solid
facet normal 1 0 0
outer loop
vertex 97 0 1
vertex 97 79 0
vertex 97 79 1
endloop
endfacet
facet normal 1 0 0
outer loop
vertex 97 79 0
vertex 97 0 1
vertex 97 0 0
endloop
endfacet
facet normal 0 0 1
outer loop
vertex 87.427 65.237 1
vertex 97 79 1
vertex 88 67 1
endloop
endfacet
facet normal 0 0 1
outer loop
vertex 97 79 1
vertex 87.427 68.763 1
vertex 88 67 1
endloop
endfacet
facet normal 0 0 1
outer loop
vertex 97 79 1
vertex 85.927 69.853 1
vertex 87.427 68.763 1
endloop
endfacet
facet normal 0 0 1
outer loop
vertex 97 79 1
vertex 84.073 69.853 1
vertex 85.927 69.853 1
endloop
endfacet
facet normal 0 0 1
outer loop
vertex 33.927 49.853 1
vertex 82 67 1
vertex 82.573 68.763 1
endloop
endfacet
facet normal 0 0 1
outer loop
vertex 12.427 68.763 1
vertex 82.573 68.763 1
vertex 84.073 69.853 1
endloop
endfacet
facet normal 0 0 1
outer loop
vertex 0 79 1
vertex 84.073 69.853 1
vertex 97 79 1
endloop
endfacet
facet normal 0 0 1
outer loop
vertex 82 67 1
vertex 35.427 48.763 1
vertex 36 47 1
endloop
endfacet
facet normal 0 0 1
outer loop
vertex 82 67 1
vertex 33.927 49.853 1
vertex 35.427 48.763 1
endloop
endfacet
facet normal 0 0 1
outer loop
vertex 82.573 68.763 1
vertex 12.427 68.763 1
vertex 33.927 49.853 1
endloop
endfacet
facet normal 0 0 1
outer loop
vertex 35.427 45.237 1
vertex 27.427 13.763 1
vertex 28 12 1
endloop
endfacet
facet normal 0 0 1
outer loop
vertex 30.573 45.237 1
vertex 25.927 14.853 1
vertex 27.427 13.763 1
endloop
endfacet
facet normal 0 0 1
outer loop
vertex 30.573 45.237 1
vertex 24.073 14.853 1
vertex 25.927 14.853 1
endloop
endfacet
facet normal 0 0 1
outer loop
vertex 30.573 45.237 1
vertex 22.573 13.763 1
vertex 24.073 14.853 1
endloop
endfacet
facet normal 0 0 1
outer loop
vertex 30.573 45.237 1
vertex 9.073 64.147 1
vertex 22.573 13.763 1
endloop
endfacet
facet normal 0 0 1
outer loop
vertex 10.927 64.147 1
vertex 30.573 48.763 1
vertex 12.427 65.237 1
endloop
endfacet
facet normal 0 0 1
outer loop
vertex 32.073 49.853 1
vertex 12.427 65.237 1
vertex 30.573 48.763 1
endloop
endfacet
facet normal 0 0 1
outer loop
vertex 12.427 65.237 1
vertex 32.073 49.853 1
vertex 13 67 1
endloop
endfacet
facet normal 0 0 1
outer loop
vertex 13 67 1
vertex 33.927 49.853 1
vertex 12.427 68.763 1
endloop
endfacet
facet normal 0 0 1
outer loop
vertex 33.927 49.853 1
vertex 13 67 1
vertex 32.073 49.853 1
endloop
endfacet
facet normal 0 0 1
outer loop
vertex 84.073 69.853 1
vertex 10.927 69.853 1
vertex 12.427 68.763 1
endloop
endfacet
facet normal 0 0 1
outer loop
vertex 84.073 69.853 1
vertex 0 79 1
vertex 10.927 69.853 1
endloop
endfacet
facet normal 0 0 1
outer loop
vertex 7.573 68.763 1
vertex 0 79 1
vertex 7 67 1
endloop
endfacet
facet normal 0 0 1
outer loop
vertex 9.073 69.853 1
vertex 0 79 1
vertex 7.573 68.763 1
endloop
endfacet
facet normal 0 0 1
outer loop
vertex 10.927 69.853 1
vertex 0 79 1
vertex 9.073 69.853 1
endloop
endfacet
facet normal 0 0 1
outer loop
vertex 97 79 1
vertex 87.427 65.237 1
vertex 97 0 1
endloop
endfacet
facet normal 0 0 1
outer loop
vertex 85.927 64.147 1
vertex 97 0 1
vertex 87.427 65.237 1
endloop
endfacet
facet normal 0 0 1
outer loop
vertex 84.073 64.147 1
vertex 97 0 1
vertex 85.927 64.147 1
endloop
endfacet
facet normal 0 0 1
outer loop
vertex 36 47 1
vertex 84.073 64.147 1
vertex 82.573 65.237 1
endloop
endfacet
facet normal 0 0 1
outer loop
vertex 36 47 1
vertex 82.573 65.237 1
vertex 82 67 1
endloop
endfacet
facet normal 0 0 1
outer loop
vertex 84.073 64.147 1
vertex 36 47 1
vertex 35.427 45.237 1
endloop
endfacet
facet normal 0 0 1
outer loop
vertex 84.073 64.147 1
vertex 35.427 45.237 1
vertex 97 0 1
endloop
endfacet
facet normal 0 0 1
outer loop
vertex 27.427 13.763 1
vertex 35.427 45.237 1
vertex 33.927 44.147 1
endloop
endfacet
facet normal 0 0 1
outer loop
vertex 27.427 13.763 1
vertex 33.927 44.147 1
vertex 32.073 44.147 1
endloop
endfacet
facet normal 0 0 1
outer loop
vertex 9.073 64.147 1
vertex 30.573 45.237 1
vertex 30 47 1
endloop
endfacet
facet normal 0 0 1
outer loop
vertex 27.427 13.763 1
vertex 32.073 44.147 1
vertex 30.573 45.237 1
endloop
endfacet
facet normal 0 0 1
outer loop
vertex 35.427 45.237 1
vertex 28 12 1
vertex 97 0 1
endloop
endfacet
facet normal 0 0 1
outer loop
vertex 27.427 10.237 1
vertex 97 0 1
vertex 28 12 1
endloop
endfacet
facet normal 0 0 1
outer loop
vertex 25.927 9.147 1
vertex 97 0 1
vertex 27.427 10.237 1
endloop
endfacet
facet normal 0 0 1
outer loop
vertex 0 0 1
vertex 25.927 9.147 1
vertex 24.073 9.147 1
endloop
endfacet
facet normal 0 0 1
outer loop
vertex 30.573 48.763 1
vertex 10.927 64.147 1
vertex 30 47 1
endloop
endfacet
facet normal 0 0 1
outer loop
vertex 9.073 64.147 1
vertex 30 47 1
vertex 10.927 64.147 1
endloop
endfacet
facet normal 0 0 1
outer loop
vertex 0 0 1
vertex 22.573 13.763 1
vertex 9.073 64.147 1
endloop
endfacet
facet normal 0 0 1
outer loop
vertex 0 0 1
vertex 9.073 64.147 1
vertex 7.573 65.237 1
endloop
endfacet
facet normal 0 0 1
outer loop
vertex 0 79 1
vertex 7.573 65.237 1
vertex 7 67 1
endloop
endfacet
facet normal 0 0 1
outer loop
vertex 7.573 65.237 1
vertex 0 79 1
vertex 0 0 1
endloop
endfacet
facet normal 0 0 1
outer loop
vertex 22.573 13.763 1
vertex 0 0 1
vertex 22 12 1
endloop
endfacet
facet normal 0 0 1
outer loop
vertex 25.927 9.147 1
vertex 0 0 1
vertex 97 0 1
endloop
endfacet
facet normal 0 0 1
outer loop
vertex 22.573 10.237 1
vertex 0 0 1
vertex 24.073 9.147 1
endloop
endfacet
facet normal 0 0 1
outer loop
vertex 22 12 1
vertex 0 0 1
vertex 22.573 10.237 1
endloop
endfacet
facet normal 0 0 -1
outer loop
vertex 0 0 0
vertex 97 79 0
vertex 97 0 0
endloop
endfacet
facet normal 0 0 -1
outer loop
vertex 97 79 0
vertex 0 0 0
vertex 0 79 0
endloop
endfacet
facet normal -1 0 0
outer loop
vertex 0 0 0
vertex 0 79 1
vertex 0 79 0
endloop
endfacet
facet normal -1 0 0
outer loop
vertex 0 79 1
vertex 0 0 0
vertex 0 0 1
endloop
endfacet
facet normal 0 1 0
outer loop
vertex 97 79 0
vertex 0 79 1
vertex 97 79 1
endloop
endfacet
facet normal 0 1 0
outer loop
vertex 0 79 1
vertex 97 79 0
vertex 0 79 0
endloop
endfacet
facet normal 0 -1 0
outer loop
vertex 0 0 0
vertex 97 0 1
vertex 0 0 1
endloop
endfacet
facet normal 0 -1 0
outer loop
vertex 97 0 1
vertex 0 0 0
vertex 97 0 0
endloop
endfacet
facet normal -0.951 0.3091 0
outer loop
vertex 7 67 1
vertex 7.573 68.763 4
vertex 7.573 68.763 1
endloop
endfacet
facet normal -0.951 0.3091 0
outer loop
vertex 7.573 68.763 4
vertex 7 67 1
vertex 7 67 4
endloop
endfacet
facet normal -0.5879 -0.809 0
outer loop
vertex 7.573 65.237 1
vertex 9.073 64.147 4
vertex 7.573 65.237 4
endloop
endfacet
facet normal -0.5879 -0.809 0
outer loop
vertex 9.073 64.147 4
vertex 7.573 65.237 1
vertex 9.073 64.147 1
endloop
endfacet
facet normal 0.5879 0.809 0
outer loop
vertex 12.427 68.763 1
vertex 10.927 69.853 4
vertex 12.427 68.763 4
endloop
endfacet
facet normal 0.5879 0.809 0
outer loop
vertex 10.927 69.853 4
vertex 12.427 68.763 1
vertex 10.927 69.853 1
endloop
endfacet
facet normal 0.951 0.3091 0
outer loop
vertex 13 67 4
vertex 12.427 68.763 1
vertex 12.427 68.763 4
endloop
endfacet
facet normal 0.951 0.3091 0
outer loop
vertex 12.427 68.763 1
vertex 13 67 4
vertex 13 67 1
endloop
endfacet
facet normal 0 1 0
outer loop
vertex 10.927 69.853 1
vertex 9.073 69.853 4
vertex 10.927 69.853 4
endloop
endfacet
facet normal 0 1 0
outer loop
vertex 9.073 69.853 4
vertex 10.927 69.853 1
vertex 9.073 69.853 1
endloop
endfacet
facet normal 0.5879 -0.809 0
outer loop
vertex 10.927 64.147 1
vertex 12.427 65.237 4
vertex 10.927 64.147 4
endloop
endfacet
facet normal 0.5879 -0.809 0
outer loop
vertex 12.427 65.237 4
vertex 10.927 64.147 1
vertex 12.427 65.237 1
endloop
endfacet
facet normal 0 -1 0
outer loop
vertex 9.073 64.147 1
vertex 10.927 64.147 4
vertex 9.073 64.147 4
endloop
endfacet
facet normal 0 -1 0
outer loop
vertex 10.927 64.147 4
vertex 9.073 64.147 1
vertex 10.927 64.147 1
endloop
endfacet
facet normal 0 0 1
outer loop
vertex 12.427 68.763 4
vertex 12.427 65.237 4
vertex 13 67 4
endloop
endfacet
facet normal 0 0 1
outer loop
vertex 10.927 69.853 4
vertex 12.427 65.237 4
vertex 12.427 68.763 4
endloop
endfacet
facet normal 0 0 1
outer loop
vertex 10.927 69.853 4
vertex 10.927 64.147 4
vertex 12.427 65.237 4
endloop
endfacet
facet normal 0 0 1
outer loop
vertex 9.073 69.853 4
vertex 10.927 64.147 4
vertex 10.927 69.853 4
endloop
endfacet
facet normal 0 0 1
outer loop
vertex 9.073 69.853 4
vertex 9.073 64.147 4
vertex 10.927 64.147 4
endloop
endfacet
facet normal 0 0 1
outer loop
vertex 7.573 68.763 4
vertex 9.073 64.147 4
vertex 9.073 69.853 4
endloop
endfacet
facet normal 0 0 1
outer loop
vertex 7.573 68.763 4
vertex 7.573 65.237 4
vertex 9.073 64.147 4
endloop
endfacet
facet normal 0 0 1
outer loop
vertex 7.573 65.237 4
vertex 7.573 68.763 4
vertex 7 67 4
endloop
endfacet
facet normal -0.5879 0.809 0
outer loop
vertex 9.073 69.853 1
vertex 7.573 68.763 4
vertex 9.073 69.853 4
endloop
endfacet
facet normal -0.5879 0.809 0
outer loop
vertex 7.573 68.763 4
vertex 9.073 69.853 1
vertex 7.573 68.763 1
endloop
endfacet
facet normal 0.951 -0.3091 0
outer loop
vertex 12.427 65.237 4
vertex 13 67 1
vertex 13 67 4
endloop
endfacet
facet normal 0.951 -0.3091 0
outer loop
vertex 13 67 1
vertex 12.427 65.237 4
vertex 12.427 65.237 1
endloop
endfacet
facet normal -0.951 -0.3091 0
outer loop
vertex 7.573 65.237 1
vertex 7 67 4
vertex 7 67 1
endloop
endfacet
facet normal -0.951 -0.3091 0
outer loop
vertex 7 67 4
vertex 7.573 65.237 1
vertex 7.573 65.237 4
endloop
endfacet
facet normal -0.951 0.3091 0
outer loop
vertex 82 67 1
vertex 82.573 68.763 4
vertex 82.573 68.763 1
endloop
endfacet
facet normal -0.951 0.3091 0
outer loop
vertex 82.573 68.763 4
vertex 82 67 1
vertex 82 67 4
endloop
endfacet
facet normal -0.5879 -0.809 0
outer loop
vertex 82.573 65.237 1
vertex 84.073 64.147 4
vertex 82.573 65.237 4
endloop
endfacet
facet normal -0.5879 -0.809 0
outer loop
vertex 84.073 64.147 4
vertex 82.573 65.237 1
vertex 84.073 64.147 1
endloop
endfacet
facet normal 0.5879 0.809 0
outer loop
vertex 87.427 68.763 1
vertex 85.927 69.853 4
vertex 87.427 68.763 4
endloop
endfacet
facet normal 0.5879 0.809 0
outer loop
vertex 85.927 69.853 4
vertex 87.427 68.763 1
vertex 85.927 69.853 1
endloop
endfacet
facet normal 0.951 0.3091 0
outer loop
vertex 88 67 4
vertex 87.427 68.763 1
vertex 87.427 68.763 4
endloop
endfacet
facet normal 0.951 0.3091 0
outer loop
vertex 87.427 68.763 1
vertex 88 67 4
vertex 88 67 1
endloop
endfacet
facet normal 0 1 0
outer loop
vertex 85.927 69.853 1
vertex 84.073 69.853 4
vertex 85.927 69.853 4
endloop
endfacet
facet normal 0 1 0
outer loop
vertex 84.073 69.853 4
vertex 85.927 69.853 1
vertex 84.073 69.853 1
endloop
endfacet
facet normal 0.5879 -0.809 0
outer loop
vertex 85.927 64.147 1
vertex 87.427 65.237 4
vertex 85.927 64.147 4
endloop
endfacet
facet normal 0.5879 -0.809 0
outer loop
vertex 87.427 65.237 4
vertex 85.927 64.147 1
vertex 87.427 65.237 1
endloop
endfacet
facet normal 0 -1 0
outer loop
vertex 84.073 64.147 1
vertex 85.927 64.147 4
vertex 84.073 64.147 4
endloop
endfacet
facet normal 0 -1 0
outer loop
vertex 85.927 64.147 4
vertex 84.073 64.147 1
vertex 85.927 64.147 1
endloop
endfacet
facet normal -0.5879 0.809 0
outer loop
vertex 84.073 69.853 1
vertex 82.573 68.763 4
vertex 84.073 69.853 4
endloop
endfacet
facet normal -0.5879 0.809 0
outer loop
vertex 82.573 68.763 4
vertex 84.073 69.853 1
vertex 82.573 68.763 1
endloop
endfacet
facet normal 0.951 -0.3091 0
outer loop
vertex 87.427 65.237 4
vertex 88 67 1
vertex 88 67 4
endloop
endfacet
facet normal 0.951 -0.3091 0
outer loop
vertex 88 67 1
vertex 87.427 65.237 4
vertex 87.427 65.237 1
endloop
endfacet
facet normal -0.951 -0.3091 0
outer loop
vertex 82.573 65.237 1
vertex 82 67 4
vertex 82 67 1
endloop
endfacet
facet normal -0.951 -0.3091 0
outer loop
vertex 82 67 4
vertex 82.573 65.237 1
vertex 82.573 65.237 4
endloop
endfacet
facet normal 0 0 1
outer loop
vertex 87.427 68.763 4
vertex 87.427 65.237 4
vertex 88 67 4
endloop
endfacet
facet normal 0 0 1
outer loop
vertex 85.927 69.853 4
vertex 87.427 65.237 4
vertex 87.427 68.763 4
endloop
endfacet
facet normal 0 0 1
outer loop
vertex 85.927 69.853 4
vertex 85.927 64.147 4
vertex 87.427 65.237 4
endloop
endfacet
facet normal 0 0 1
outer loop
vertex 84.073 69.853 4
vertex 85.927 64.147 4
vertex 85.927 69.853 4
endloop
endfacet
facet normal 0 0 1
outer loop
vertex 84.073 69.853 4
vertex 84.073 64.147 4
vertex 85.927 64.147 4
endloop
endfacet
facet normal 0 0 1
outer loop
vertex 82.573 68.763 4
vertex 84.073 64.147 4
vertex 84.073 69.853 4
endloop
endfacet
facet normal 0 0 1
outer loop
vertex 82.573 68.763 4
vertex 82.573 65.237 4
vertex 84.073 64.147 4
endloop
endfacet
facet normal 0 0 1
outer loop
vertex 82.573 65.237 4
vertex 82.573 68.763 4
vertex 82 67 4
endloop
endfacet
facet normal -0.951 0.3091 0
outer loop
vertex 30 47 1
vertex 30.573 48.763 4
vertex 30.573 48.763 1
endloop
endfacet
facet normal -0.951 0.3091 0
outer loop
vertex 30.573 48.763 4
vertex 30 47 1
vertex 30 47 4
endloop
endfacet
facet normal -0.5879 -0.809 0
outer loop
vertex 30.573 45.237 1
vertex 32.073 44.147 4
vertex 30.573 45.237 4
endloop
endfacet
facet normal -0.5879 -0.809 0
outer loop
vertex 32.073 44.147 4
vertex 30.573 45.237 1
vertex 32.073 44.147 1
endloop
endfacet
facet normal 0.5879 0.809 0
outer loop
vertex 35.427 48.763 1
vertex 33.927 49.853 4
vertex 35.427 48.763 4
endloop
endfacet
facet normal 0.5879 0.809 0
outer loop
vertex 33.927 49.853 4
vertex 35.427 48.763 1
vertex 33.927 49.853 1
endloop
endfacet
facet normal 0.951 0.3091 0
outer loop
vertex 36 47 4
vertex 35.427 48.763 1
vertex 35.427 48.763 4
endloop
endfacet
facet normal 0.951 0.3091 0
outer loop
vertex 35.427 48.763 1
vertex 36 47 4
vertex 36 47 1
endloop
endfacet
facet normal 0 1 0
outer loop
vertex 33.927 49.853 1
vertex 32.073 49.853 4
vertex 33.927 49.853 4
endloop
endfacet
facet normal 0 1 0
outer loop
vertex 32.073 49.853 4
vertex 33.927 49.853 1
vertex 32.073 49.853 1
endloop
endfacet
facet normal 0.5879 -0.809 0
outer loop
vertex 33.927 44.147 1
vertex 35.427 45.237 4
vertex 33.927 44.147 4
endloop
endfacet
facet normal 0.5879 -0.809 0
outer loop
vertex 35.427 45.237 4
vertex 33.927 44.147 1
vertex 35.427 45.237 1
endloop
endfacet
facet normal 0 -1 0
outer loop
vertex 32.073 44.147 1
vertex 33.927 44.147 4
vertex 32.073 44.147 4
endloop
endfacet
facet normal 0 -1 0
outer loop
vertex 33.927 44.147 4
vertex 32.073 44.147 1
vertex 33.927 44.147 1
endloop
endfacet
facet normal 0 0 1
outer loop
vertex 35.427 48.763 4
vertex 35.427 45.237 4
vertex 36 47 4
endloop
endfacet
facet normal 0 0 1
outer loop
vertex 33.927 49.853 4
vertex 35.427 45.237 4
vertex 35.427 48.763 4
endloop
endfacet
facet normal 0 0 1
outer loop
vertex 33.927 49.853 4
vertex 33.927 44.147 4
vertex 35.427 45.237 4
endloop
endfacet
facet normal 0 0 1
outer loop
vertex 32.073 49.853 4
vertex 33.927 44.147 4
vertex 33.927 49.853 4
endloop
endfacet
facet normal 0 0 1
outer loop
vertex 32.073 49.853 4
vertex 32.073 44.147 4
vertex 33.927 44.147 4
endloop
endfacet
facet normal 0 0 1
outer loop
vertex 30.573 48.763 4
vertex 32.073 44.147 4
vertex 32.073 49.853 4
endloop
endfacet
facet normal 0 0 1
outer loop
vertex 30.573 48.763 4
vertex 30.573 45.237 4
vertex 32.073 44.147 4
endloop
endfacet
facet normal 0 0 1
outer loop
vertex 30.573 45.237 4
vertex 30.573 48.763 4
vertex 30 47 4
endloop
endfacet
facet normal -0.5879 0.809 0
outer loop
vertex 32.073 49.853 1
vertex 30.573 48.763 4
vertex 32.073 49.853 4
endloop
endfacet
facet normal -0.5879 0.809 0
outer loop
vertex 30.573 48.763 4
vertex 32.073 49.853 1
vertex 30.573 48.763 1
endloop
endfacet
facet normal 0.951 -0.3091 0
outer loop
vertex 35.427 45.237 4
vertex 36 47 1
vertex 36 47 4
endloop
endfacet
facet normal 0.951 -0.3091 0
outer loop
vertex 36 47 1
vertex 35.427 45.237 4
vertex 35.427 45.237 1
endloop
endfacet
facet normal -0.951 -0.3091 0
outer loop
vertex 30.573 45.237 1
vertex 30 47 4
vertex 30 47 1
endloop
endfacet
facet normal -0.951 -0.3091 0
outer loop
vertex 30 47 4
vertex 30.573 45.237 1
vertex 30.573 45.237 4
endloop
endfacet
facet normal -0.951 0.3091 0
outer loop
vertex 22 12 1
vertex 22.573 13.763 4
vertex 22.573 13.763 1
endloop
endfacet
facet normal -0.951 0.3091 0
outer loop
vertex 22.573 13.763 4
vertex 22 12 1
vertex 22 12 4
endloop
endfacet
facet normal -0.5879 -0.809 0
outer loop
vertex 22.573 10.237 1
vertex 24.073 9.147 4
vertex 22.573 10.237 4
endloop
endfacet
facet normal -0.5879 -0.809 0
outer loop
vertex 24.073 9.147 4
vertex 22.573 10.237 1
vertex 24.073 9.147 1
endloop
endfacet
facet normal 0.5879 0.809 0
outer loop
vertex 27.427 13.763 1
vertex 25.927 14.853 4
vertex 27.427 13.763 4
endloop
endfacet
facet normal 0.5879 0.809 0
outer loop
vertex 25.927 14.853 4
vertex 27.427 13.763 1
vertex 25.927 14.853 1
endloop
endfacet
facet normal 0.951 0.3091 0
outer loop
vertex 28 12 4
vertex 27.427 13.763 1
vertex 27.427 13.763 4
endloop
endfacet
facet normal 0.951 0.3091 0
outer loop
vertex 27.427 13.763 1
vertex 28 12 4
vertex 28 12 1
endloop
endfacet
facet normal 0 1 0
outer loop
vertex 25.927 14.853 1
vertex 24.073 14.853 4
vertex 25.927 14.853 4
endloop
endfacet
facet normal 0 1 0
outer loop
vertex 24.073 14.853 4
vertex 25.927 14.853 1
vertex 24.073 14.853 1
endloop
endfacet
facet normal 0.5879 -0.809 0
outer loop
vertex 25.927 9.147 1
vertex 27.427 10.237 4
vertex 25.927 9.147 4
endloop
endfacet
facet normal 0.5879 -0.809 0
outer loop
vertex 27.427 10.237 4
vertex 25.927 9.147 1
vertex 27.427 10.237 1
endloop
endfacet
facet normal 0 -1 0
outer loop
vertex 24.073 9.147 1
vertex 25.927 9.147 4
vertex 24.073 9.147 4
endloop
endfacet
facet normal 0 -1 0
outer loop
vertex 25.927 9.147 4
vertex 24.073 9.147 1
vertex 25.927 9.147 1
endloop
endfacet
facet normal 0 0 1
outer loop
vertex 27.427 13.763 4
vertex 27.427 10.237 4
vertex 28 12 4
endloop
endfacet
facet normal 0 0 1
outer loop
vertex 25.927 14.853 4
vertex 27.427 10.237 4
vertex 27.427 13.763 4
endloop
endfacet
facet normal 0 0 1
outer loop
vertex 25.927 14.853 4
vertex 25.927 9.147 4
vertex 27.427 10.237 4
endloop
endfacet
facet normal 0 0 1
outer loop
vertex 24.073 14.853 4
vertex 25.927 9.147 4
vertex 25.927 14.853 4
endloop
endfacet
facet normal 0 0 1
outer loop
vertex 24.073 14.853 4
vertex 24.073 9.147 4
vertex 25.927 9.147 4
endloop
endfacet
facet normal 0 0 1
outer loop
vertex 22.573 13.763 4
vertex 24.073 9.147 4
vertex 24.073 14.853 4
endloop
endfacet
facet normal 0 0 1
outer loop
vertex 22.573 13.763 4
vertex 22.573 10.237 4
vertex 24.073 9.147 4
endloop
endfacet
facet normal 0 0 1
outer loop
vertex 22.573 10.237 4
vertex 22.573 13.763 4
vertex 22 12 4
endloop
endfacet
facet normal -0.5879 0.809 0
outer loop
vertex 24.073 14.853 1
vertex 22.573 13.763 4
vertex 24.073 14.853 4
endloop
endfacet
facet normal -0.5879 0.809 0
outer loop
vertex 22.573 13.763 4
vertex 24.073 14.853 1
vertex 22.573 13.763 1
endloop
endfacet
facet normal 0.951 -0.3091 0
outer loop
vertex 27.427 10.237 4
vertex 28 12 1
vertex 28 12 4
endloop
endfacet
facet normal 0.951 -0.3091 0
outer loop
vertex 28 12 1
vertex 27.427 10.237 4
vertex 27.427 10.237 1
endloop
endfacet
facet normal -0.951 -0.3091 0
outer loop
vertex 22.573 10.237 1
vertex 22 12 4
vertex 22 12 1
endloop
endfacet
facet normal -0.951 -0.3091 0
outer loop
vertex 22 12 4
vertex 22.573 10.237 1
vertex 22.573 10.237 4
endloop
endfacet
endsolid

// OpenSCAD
    cube([97,79,1]);
    
    translate([10,67,0.9999])
        color("#acacac")
        cylinder(3,3,3);
        
     translate([85,67,0.9999])
        color("#acacac")
        cylinder(3,3,3);
        
        
             translate([33,47,0.9999])
        color("#acacac")
        cylinder(3,3,3);
        
               translate([25,12,0.9999])
        color("#acacac")
        cylinder(3,3,3);
